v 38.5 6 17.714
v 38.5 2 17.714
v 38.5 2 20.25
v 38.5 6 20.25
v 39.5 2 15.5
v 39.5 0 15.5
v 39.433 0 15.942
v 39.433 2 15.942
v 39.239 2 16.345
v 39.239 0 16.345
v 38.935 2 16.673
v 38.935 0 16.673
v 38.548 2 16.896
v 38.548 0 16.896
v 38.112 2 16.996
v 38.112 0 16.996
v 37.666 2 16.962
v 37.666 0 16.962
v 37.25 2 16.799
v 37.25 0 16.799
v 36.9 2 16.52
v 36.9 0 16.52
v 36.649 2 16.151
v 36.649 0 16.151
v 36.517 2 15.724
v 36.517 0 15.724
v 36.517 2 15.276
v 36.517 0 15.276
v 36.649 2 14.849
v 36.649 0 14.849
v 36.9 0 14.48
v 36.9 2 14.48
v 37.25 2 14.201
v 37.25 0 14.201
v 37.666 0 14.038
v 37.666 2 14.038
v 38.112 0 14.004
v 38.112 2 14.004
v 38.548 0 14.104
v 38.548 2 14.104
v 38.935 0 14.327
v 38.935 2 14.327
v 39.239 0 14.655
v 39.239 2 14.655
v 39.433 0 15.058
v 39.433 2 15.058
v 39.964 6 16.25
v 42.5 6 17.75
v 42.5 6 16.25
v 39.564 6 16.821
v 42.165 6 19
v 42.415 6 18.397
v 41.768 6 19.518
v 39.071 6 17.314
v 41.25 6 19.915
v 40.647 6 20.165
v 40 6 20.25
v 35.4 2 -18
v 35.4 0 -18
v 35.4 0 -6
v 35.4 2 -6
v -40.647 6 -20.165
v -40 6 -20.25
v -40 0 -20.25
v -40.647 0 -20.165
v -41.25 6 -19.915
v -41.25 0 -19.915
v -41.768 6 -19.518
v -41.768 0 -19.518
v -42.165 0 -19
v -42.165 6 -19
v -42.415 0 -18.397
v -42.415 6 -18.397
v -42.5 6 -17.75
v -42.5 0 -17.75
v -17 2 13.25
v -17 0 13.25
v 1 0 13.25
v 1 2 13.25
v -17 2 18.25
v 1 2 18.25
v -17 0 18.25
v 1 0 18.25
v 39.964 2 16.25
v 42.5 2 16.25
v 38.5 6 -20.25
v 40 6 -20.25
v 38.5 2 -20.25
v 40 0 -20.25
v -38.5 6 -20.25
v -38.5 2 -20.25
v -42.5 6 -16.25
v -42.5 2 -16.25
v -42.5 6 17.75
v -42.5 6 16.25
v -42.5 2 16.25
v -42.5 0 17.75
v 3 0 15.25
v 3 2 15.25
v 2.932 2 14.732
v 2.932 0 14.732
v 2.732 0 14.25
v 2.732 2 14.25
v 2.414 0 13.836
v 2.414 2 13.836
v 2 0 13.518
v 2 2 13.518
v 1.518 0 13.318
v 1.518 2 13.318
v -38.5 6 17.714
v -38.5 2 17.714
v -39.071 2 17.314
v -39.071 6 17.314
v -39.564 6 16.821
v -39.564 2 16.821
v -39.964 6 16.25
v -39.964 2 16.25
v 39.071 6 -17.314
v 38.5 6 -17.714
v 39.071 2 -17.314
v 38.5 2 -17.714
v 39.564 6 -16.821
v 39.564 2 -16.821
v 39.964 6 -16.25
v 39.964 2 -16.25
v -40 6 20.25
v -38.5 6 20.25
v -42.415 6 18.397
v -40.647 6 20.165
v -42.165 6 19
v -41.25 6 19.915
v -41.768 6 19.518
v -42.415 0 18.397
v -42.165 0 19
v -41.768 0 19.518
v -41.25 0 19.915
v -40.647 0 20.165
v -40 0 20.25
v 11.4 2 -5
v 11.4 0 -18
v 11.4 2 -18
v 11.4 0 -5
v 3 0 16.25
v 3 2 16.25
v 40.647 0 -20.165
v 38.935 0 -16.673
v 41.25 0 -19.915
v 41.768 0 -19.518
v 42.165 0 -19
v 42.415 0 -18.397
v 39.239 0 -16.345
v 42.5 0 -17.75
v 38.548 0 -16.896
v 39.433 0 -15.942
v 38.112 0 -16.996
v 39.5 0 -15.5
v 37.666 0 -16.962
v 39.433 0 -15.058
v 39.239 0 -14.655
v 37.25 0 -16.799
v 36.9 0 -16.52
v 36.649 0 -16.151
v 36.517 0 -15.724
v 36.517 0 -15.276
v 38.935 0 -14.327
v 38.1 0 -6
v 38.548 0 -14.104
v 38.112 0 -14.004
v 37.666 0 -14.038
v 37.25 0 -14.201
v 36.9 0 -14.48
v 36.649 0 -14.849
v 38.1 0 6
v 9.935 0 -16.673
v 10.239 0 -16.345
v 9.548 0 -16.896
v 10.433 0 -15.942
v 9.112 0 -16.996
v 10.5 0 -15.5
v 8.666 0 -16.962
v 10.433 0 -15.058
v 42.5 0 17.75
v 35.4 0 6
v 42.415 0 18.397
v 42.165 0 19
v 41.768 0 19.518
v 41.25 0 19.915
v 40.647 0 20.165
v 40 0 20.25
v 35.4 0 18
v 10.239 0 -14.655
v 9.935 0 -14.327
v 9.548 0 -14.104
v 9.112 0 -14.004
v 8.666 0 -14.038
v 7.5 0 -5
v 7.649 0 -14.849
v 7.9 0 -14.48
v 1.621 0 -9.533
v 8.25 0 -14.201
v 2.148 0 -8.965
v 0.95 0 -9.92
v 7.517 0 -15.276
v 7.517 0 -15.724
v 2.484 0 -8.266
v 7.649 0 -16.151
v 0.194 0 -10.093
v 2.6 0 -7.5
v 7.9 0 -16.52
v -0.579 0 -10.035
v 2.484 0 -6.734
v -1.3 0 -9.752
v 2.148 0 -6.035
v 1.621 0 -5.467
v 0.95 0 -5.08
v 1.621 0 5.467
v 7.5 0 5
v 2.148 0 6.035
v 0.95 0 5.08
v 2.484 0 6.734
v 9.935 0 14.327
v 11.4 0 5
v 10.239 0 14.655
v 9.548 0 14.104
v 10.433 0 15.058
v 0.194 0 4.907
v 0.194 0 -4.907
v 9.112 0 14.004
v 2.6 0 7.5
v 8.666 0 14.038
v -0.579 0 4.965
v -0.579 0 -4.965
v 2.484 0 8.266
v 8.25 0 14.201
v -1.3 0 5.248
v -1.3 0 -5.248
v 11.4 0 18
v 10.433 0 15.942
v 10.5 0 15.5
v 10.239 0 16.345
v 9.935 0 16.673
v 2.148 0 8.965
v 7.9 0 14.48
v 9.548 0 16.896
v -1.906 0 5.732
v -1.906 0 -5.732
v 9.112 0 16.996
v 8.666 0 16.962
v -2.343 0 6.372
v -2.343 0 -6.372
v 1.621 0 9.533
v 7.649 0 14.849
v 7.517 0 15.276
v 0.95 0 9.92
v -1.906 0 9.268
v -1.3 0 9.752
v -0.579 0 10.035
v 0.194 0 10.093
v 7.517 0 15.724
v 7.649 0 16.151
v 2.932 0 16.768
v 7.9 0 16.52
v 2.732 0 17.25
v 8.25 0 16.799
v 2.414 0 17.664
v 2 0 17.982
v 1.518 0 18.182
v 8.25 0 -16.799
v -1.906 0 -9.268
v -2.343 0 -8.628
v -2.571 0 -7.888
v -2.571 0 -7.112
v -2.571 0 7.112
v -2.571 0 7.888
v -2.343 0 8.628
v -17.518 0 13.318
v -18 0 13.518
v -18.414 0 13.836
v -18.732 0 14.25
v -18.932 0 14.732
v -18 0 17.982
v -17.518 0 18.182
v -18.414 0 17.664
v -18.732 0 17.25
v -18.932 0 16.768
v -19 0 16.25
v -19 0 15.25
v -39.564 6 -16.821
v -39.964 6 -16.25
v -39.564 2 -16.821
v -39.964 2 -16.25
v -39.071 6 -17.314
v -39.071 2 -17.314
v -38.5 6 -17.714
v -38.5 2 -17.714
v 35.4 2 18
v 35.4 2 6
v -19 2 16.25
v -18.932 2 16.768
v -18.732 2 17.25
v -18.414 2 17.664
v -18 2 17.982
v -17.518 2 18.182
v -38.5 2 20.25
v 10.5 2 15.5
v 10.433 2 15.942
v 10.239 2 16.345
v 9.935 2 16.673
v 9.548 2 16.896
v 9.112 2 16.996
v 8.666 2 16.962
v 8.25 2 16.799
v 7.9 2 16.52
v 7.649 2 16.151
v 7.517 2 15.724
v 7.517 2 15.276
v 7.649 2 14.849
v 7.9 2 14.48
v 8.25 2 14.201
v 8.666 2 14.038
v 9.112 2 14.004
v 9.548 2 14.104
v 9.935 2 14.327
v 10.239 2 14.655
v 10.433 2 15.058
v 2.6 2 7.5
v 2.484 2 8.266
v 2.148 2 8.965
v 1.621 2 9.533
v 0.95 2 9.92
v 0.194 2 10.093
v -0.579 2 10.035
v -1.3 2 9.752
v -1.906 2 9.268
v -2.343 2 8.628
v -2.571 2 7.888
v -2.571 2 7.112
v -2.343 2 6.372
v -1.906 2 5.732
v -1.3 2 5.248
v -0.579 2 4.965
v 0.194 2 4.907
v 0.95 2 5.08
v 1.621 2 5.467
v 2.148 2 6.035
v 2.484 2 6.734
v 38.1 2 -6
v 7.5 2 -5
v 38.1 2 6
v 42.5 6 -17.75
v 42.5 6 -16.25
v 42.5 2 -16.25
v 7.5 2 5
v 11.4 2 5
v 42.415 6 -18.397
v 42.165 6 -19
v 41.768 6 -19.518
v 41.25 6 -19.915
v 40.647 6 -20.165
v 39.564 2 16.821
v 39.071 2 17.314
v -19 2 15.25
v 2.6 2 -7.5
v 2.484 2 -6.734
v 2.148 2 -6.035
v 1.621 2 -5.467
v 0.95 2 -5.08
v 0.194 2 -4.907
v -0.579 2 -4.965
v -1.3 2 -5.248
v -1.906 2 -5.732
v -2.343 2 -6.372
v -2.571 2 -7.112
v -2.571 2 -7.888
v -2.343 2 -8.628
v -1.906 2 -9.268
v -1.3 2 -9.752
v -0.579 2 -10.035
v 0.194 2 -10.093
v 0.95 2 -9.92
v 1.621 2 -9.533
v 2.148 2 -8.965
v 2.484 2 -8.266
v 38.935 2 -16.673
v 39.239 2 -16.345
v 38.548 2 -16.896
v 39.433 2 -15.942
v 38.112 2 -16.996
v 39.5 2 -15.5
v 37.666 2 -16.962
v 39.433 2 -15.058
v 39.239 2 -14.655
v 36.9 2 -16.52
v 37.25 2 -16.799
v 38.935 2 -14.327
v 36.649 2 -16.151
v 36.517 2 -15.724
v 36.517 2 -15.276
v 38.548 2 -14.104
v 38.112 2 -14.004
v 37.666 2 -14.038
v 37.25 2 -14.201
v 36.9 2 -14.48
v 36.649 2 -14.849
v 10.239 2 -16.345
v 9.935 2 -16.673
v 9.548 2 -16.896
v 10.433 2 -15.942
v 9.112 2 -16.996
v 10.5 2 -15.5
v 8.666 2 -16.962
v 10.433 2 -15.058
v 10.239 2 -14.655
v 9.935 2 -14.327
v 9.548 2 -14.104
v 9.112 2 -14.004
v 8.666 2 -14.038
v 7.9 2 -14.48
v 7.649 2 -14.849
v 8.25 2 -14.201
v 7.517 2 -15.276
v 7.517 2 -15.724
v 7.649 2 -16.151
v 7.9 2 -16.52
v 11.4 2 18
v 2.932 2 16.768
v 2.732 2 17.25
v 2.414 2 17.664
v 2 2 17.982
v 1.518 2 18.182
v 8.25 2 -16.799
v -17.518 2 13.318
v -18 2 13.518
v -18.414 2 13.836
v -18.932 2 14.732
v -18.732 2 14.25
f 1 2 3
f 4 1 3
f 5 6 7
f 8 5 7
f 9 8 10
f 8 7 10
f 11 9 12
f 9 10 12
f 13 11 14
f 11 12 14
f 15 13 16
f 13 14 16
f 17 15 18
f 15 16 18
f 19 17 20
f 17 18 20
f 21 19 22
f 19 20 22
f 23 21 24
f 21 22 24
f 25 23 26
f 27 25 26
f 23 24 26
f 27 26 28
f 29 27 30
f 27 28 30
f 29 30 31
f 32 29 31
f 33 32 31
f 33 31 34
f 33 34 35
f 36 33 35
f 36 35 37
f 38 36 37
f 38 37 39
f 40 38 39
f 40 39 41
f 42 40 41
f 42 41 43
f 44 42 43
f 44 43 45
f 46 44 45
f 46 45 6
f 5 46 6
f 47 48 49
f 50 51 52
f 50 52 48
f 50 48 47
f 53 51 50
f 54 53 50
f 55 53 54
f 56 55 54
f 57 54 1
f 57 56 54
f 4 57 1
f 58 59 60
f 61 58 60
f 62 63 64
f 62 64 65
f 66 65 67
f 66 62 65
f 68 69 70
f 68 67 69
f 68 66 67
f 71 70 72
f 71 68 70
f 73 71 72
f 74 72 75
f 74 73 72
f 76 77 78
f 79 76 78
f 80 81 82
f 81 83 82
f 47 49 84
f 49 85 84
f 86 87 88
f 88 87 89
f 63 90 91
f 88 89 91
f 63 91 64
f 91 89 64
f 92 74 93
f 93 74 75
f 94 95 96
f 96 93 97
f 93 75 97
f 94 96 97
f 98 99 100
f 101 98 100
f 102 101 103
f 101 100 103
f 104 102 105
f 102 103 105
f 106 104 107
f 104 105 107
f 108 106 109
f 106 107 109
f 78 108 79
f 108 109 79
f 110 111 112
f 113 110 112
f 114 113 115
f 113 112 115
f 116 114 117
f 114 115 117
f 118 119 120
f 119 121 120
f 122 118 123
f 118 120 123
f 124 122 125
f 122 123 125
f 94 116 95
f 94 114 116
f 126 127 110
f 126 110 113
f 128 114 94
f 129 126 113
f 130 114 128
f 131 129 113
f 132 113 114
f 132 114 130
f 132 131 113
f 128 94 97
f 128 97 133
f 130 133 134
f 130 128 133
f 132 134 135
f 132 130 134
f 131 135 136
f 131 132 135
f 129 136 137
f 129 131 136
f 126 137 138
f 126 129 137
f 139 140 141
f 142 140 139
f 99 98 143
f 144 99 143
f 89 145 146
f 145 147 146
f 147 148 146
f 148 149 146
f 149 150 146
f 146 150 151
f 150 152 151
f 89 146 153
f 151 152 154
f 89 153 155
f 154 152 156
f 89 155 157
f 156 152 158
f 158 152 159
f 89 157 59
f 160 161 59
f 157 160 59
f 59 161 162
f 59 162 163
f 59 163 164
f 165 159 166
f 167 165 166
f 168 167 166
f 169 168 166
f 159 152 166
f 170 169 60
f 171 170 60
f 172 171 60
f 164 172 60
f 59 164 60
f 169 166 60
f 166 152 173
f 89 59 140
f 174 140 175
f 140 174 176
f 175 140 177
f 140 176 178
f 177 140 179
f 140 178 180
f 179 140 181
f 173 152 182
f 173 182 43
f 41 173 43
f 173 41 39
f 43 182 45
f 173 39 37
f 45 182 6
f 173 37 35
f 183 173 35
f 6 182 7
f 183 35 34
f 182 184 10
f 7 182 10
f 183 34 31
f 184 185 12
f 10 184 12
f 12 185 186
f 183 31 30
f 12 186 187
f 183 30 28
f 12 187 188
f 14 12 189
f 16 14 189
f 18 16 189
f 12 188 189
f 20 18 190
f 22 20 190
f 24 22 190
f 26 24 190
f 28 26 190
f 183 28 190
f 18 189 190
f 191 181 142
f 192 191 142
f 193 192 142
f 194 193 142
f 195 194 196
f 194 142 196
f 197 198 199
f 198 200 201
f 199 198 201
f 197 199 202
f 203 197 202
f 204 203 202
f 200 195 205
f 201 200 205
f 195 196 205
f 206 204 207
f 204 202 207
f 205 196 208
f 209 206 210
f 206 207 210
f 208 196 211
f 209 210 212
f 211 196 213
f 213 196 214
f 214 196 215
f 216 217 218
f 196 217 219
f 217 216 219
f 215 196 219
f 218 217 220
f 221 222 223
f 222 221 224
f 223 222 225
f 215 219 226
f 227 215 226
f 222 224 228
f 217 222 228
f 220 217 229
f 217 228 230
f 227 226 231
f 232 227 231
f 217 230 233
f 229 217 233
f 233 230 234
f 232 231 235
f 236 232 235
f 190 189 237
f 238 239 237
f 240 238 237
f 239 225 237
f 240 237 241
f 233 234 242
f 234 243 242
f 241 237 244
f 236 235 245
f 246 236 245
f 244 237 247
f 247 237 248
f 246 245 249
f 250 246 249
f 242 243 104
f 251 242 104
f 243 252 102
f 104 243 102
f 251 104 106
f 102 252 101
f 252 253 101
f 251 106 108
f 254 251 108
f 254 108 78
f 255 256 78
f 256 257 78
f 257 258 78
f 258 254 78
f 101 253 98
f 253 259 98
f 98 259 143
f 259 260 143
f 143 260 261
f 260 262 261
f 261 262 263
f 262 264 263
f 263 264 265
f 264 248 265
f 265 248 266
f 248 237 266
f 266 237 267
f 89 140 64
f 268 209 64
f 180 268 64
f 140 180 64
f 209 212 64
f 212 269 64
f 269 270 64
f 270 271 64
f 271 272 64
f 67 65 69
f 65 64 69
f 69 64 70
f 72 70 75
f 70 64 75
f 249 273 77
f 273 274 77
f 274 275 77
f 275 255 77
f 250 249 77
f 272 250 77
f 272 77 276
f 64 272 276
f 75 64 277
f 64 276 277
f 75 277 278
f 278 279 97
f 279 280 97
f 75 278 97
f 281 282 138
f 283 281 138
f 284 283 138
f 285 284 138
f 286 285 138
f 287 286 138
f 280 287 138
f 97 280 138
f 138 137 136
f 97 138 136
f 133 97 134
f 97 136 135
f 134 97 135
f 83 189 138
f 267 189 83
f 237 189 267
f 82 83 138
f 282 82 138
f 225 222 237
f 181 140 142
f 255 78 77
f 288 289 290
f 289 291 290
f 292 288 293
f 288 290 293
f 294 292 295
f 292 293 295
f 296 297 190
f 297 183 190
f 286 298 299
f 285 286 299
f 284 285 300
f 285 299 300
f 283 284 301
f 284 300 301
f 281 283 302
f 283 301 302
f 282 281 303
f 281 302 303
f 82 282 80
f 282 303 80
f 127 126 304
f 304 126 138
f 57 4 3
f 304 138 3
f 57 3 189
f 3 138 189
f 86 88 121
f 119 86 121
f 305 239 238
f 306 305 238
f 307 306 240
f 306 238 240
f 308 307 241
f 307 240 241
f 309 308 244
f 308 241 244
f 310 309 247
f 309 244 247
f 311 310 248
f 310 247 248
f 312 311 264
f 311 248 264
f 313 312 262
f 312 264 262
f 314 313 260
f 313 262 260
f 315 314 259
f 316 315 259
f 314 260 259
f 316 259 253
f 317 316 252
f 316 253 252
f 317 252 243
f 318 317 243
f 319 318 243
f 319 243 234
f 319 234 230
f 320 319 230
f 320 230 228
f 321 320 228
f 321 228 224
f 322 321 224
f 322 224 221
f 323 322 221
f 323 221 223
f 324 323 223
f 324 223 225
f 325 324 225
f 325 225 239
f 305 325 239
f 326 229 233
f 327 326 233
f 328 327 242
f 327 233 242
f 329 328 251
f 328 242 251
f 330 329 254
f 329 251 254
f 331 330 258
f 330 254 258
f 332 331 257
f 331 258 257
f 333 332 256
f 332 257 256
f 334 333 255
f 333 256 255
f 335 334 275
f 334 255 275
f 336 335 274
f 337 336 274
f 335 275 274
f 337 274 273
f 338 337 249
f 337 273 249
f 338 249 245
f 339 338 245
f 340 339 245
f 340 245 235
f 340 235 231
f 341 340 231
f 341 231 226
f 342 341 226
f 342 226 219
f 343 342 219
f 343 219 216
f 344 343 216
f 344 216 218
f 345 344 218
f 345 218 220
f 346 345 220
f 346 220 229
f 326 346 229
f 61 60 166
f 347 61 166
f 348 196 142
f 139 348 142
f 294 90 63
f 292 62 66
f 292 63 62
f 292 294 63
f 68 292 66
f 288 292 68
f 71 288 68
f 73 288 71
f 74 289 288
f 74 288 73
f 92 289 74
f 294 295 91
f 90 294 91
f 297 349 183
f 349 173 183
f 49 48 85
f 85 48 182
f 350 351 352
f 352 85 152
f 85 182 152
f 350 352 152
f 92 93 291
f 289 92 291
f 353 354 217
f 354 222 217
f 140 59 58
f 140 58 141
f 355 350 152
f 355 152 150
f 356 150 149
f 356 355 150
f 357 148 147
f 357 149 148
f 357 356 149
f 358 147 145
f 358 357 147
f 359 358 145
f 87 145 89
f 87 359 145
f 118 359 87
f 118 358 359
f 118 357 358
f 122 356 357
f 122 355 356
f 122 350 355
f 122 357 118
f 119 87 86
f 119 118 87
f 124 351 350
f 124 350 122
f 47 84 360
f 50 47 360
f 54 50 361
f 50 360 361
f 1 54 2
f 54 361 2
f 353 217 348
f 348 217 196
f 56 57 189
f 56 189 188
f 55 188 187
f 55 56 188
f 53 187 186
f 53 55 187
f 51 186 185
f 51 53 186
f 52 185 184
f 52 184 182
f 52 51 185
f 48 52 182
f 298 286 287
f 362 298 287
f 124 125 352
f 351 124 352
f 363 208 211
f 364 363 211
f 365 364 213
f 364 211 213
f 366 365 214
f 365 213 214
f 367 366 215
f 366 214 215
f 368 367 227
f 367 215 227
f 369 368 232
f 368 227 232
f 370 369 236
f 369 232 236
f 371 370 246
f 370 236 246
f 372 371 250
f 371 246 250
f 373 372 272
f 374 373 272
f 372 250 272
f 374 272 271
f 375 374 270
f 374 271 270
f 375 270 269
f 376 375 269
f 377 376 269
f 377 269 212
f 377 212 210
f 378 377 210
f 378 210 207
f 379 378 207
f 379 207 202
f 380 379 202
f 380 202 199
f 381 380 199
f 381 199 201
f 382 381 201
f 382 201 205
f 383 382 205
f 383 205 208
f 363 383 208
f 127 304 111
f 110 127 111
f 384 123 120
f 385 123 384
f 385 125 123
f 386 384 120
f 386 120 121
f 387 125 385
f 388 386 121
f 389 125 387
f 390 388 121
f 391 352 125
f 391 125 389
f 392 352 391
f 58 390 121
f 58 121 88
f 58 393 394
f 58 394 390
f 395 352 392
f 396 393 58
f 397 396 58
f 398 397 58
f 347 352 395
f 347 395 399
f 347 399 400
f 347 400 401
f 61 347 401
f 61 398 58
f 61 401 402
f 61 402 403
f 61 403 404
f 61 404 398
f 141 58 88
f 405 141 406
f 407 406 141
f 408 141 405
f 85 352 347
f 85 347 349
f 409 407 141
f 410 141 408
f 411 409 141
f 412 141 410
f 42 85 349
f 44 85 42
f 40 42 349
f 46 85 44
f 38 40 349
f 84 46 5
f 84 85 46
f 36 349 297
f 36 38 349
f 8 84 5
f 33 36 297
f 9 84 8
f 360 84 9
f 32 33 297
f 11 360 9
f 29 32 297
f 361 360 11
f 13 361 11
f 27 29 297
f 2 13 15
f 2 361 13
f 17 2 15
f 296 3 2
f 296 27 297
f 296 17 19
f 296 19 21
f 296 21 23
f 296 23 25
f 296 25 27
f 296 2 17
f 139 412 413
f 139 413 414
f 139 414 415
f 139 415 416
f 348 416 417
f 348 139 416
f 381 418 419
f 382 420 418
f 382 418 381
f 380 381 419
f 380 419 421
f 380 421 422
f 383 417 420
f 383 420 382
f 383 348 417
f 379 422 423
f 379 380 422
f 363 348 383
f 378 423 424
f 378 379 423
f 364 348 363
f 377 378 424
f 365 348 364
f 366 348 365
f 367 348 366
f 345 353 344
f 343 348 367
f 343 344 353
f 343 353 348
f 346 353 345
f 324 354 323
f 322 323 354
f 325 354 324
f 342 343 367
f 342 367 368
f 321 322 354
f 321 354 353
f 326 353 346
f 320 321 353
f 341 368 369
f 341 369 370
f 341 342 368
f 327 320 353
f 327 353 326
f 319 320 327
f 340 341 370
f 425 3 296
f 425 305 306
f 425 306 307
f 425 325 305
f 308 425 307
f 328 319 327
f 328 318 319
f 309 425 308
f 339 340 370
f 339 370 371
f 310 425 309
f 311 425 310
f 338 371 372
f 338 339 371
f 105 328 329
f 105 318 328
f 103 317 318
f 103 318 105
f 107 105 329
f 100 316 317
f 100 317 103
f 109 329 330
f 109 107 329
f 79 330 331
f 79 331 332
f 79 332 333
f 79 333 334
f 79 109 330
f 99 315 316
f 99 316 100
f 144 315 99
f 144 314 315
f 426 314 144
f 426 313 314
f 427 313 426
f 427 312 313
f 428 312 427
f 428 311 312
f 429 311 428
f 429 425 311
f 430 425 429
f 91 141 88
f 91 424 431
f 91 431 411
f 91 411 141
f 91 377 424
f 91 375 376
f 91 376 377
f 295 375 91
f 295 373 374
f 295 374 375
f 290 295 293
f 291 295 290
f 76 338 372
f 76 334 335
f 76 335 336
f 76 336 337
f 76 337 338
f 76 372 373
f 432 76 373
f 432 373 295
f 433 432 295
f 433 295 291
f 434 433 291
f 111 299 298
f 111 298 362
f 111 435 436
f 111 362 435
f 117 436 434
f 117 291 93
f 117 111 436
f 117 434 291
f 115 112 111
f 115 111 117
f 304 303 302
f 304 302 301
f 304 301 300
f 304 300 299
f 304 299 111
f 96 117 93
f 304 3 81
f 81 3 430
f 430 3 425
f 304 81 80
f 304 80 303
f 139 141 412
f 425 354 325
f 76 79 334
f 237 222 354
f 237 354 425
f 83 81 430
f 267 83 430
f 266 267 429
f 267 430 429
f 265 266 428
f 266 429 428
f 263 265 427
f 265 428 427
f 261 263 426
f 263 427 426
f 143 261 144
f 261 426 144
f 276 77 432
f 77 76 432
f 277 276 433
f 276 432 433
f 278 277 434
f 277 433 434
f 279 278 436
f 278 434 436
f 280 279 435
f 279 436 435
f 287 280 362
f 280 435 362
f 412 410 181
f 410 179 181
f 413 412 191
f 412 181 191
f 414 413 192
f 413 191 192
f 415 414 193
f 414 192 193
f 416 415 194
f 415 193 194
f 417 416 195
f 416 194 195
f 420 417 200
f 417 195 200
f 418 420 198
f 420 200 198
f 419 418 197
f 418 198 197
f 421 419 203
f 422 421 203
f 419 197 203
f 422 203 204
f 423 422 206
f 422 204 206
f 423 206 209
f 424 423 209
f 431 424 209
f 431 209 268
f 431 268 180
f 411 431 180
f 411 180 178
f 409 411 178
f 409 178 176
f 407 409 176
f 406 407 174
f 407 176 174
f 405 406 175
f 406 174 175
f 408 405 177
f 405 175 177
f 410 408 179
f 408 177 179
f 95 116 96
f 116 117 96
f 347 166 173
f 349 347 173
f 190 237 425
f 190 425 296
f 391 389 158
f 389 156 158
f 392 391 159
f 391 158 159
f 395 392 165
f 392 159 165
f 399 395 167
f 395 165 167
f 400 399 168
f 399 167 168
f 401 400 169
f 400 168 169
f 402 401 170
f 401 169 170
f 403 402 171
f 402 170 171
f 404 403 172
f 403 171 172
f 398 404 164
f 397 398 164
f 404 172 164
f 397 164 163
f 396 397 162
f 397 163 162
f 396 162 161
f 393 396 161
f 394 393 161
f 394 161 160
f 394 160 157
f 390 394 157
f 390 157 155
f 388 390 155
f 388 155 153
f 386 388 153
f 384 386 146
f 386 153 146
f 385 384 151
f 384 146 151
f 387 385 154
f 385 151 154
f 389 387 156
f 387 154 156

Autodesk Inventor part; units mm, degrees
ref_plane "YZ Plane" through (0, 0, 0) normal (1, 0, 0) x (0, 1, 0)
ref_plane "XZ Plane" through (0, 0, 0) normal (0, 1, 0) x (-1, 0, 0)
ref_plane "XY Plane" through (0, 0, 0) normal (0, 0, 1) x (1, 0, 0)
sketch "草图3" plane through (0, 0, 0) normal (0, 1, 0) x (-1, 0, 0)
  line L0 (40, 20.25) -> (-40, 20.25)
  line L1 (-42.5, 17.75) -> (-42.5, -17.75)
  line L2 (-40, -20.25) -> (40, -20.25)
  line L3 (42.5, -17.75) -> (42.5, 17.75)
  line L4 (42.5, 20.25) -> (-42.5, -20.25) construction
  line L5 (-42.5, 20.25) -> (42.5, -20.25) construction
  arc A0 (42.5, 17.75) -> (40, 20.25) centre (40, 17.75) ccw
  arc A1 (-40, 20.25) -> (-42.5, 17.75) centre (-40, 17.75) ccw
  arc A2 (-42.5, -17.75) -> (-40, -20.25) centre (-40, -17.75) ccw
  arc A3 (40, -20.25) -> (42.5, -17.75) centre (40, -17.75) ccw
  circle A4 centre (40.5, 18.25) radius 1
  line L6 (42.5, 0) -> (50.0267, 0)
  circle A5 centre (40.5, -18.25) radius 1
  line L7 (0, 0) -> (0, 15.1914)
  circle A6 centre (-40.5, 18.25) radius 1
  circle A7 centre (-40.5, -18.25) radius 1
  line L8 (42.5, 20.25) -> (38.5, 20.25)
  line L9 (38.5, 20.25) -> (38.5, 16.25)
  line L10 (38.5, 16.25) -> (42.5, 16.25)
  line L11 (42.5, 16.25) -> (42.5, 20.25)
  line L12 (42.5, 20.25) -> (38.5, 16.25) construction
  line L13 (38.5, 20.25) -> (42.5, 16.25) construction
  line L14 (42.5, -16.25) -> (38.5, -16.25)
  line L15 (38.5, -16.25) -> (38.5, -20.25)
  line L16 (38.5, -20.25) -> (42.5, -20.25)
  line L17 (42.5, -20.25) -> (42.5, -16.25)
  line L18 (42.5, -16.25) -> (38.5, -20.25) construction
  line L19 (38.5, -16.25) -> (42.5, -20.25) construction
  line L20 (-38.5, 20.25) -> (-42.5, 20.25)
  line L21 (-42.5, 20.25) -> (-42.5, 16.25)
  line L22 (-42.5, 16.25) -> (-38.5, 16.25)
  line L23 (-38.5, 16.25) -> (-38.5, 20.25)
  line L24 (-38.5, 20.25) -> (-42.5, 16.25) construction
  line L25 (-42.5, 20.25) -> (-38.5, 16.25) construction
  line L26 (-38.5, -16.25) -> (-42.5, -16.25)
  line L27 (-42.5, -16.25) -> (-42.5, -20.25)
  line L28 (-42.5, -20.25) -> (-38.5, -20.25)
  line L29 (-38.5, -20.25) -> (-38.5, -16.25)
  line L30 (-38.5, -16.25) -> (-42.5, -20.25) construction
  line L31 (-42.5, -16.25) -> (-38.5, -20.25) construction
  line L32 (-36.5, 18.25) -> (36.5, 18.25)
  arc A8 (40.5, 17.75) -> (40, 18.25) centre (40, 17.75) ccw
  line L33 (40.5, 14.25) -> (40.5, -14.25)
  arc A9 (40, -18.25) -> (40.5, -17.75) centre (40, -17.75) ccw
  line L34 (36.5, -18.25) -> (-36.5, -18.25)
  arc A10 (-40.5, -17.75) -> (-40, -18.25) centre (-40, -17.75) ccw
  line L35 (-40.5, -14.25) -> (-40.5, 14.25)
  arc A11 (-40, 18.25) -> (-40.5, 17.75) centre (-40, 17.75) ccw
  arc A12 (-40.5, -14.25) -> (-36.5, -18.25) centre (-36.5, -14.25) ccw
  arc A13 (-36.5, 18.25) -> (-40.5, 14.25) centre (-36.5, 14.25) ccw
  arc A14 (40.5, 14.25) -> (36.5, 18.25) centre (36.5, 14.25) ccw
  arc A15 (36.5, -18.25) -> (40.5, -14.25) centre (36.5, -14.25) ccw
  point P0 (-38.5, -17.7141)
  point P1 (-39.9641, -16.25)
  point P2 (-39.9641, 16.25)
  point P3 (-38.5, 17.7141)
  point P4 (39.9641, -16.25)
  point P5 (38.5, -17.7141)
  point P6 (38.5, 17.7141)
  point P7 (39.9641, 16.25)
  dimension "d11" = 85
  dimension "d12" = 40.5
  dimension "d13" = 2.5
  dimension "d14" = 2
  dimension "d15" = 2
  dimension "d16" = 2
  dimension "d72" = 4
  dimension "d73" = 4
  dimension "d74" = 4
  dimension "d75" = 4
  dimension "d76" = 4
  dimension "d77" = 4
  dimension "d78" = 4
  dimension "d79" = 4
  dimension "d80" = 2
  dimension "d81" = 4
extrude "拉伸3" add sketch "草图3" along normal blind 2 contours A0 L3 L10 A14 L9 L0 | L9 A14 L32 A13 L23 L0 | L23 A13 L22 L1 A1 L0 | A14 L10 L9 | L9 L10 A14 L33 A15 L14 L15 L34 A12 L29 L26 L35 A13 L22 L23 L32 | L3 L14 A15 L33 A14 L10 | L23 L22 A13 | A13 L35 A12 L26 L1 L22 | L3 A3 L2 L15 A15 L14 | A15 L15 L14 | L26 A12 L29 L2 A2 L1 | L15 L2 L29 A12 L34 A15 | L26 L29 A12 | A4 | A5 | A6 | A7
extrude "拉伸4" add sketch "草图3" along normal blind 6 contours A0 L3 L10 A14 L9 L0 | L8 L11 A0 | L23 A13 L22 L1 A1 L0 | A1 L21 L20 | L3 A3 L2 L15 A15 L14 | L17 L16 A3 | L26 A12 L29 L2 A2 L1 | A2 L28 L27 | A4 | A5 | A6 | A7
sketch "草图4" plane through (0, 0, 0) normal (0, -1, 0) x (1, 0, 0)
  line L0 (40.5, -20.1774) -> (40.5, 20.25)
  line L1 (-38.5, 20.25) -> (38.5, 20.25) projected
  line L2 (42.5, 17.75) -> (42.5, -17.75) projected
  line L3 (38.5, -20.25) -> (-38.5, -20.25) projected
  line L4 (6.5, -20.25) -> (6.5, 20.25)
  circle A0 centre (38, -15.5) radius 1.5
  line L5 (40.5, -18) -> (25.2781, -18)
  line L6 (25.2781, -18) -> (6.5, -18)
  line L7 (6.5, 18) -> (40.5, 18)
  line L8 (23.5, 18) -> (23.5, -18)
  circle A1 centre (9, -15.5) radius 1.5
  circle A2 centre (9, 15.5) radius 1.5
  circle A3 centre (38, 15.5) radius 1.5
  line L9 (11.4, -18) -> (11.4, 18)
  line L10 (35.4, -18) -> (35.4, 18)
  line L11 (35.4, -6) -> (38.1, -6)
  line L12 (38.1, -6) -> (38.1, 6)
  line L13 (38.1, 6) -> (35.4, 6)
  line L14 (6.5, -5) -> (9.5, -5)
  line L15 (9.5, -5) -> (9.5, 5)
  line L16 (9.5, 5) -> (6.5, 5)
  line L17 (7.5, -5) -> (11.5, -5)
  line L18 (11.5, -5) -> (11.5, 5)
  line L19 (11.5, 5) -> (7.5, 5)
  line L20 (7.5, 5) -> (7.5, -5)
  line L21 (7.5, -5) -> (11.5, 5) construction
  line L22 (11.5, -5) -> (7.5, 5) construction
  point P0 (0, 0)
  point P1 (-40, 20.25)
  point P2 (40, 20.25)
  point P3 (40, -20.25)
  point P4 (-40, -20.25)
  point P5 (9.5, 0)
  point P6 (7.5, 5)
  point P7 (7.5, -5)
  dimension "d21" = 2
  dimension "d22" = 34
  dimension "d23" = 3
  dimension "d24" = 2.5
  dimension "d25" = 18
  dimension "d26" = 2.5
  dimension "d27" = 18
  dimension "d28" = 3
  dimension "d29" = 3
  dimension "d30" = 3
  dimension "d31" = 2.5
  dimension "d32" = 2.5
  dimension "d33" = 2.5
  dimension "d34" = 2.5
  dimension "d35" = 2.5
  dimension "d36" = 2.5
  dimension "d37" = 2.4
  dimension "d38" = 24
  dimension "d39" = 2.7
  dimension "d40" = 6
  dimension "d41" = 12
  dimension "d42" = 3
  dimension "d43" = 5
  dimension "d44" = 10
  dimension "d45" = 4
  dimension "d46" = 10
extrude "拉伸5" cut sketch "草图4" against normal blind 2 contours L5 L6 L8 L7 L10 | L10 L13 L12 L11 | L8 L6 L9 L17 L18 L19 L7 | L19 L18 L17 L9 | L9 L17 L15 L19 | L15 L14 L20 L16 | A0 | A1 | A2 | A3
fillet "圆角6" radius 2.5 4 edges at (-42.5, 3, -20.25) (-42.5, 3, 20.25) (42.5, 3, 20.25) (42.5, 3, -20.25)
sketch "草图6" plane through (0, 0, 0) normal (0, -1, 0) x (1, 0, 0)
  line L0 (-40, 20.25) -> (40, 20.25) projected
  line L1 (0, 20.25) -> (-19, 20.25)
  line L2 (-19, 20.25) -> (-19, 13.25)
  line L3 (-19, 13.25) -> (0, 13.25)
  line L4 (0, 13.25) -> (0, 20.25)
  line L5 (0, 13.25) -> (3, 13.25)
  line L6 (3, 13.25) -> (3, 20.25)
  line L7 (3, 20.25) -> (0, 20.25)
  line L8 (0, 20.25) -> (0, 13.25)
  line L9 (3, 20.25) -> (3, 18.25)
  line L10 (3, 18.25) -> (-19, 18.25)
  point P0 (0, 0)
  dimension "d83" = 19
  dimension "d84" = 7
  dimension "d85" = 3
  dimension "d86" = 7
  dimension "d87" = 2
extrude "拉伸7" cut sketch "草图6" against normal blind 2 contours L10 L4 L3 L2 | L10 L6 L5 L4
fillet "圆角7" radius 2 4 edges at (3, 1, 13.25) (3, 1, 18.25) (-19, 1, 13.25) (-19, 1, 18.25)
sketch "草图7" plane through (0, 0, 0) normal (0, -1, 0) x (1, 0, 0)
  circle A0 centre (0, 0) radius 7.5
  circle A1 centre (0, -7.5) radius 2.6
  circle A2 centre (0, 7.5) radius 2.6
  dimension "d91" = 5.2
  dimension "d92" = 5.2
extrude "拉伸8" cut sketch "草图7" against normal blind 2 contours A2 A0 | A0 A2 | A1 A0 | A0 A1
properties part number "盖" material "聚碳酸酯，透明"
